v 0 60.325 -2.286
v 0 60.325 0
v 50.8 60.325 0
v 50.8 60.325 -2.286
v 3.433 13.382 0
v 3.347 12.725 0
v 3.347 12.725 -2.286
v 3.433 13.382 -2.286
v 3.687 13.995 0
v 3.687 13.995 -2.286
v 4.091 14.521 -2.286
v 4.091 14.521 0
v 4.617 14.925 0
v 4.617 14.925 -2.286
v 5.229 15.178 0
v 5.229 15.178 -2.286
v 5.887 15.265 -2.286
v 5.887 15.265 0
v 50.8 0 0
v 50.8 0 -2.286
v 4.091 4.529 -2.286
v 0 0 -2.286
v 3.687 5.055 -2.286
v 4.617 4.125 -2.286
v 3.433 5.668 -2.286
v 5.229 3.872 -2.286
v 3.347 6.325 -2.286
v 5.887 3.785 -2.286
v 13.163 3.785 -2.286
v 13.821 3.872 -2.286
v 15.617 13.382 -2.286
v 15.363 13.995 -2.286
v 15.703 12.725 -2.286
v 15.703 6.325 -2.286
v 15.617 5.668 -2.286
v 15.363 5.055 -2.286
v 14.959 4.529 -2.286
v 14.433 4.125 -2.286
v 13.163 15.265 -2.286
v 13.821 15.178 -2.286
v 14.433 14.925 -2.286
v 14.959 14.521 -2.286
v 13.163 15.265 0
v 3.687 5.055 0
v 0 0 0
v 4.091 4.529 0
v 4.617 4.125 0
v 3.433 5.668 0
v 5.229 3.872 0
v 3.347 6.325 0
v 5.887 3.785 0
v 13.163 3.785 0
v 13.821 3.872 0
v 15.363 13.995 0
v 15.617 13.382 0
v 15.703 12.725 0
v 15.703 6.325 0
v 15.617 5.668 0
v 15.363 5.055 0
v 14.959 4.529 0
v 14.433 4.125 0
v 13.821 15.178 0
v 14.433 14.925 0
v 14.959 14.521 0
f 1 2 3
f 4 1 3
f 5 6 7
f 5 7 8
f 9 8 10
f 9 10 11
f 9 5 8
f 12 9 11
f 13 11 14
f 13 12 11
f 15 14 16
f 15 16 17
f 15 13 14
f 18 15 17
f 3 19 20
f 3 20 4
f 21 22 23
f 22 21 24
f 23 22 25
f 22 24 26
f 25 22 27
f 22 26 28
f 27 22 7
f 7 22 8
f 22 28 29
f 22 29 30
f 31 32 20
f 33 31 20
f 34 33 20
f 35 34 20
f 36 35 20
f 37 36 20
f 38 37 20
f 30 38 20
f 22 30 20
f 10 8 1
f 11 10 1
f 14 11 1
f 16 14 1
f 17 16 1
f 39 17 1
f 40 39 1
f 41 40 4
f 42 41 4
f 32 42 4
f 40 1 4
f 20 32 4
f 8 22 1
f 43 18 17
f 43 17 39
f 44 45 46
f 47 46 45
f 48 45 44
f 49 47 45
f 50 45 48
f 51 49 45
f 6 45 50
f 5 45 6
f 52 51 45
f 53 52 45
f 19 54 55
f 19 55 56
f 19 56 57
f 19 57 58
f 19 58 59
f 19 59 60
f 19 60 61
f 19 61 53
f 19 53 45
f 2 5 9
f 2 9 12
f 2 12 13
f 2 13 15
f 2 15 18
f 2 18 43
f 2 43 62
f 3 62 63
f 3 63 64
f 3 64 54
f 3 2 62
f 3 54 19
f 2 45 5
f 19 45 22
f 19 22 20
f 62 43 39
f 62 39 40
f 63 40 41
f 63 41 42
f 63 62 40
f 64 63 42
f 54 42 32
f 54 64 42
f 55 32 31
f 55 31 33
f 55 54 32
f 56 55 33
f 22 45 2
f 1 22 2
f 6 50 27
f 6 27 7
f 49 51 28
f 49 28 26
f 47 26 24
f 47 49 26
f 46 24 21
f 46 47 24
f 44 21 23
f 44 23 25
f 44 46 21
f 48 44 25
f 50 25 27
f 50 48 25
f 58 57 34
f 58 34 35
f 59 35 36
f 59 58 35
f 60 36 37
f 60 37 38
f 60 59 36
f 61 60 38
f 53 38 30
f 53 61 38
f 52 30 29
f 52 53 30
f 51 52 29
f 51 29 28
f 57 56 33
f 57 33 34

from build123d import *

# Parameters (mm, degrees)
SKETCH1_W      = 50.8
SKETCH1_H      = 60.325
EXTRUDE2_DEPTH = 2.286


with BuildPart() as part:
    # Sketch1 → Extrude2 (new body)
    with BuildSketch(Plane.XY):
        with Locations((25.4, 30.1625)):
            Rectangle(SKETCH1_W, SKETCH1_H)
        with BuildLine():
            Line((5.886865084, 15.264808366), (13.163134916, 15.264808366))
            ThreePointArc((13.163134916, 15.264808366), (14.95918614, 14.52085959), (15.703134916, 12.724808366))
            Line((15.703134916, 12.724808366), (15.703134916, 6.325191634))
            ThreePointArc((15.703134916, 6.325191634), (14.95918614, 4.52914041), (13.163134916, 3.785191634))
            Line((13.163134916, 3.785191634), (5.886865084, 3.785191634))
            ThreePointArc((5.886865084, 3.785191634), (4.09081386, 4.52914041), (3.346865084, 6.325191634))
            Line((3.346865084, 6.325191634), (3.346865084, 12.724808366))
            ThreePointArc((3.346865084, 12.724808366), (4.09081386, 14.52085959), (5.886865084, 15.264808366))
        make_face(mode=Mode.SUBTRACT)
    extrude(amount=-EXTRUDE2_DEPTH)


solid = part.part
